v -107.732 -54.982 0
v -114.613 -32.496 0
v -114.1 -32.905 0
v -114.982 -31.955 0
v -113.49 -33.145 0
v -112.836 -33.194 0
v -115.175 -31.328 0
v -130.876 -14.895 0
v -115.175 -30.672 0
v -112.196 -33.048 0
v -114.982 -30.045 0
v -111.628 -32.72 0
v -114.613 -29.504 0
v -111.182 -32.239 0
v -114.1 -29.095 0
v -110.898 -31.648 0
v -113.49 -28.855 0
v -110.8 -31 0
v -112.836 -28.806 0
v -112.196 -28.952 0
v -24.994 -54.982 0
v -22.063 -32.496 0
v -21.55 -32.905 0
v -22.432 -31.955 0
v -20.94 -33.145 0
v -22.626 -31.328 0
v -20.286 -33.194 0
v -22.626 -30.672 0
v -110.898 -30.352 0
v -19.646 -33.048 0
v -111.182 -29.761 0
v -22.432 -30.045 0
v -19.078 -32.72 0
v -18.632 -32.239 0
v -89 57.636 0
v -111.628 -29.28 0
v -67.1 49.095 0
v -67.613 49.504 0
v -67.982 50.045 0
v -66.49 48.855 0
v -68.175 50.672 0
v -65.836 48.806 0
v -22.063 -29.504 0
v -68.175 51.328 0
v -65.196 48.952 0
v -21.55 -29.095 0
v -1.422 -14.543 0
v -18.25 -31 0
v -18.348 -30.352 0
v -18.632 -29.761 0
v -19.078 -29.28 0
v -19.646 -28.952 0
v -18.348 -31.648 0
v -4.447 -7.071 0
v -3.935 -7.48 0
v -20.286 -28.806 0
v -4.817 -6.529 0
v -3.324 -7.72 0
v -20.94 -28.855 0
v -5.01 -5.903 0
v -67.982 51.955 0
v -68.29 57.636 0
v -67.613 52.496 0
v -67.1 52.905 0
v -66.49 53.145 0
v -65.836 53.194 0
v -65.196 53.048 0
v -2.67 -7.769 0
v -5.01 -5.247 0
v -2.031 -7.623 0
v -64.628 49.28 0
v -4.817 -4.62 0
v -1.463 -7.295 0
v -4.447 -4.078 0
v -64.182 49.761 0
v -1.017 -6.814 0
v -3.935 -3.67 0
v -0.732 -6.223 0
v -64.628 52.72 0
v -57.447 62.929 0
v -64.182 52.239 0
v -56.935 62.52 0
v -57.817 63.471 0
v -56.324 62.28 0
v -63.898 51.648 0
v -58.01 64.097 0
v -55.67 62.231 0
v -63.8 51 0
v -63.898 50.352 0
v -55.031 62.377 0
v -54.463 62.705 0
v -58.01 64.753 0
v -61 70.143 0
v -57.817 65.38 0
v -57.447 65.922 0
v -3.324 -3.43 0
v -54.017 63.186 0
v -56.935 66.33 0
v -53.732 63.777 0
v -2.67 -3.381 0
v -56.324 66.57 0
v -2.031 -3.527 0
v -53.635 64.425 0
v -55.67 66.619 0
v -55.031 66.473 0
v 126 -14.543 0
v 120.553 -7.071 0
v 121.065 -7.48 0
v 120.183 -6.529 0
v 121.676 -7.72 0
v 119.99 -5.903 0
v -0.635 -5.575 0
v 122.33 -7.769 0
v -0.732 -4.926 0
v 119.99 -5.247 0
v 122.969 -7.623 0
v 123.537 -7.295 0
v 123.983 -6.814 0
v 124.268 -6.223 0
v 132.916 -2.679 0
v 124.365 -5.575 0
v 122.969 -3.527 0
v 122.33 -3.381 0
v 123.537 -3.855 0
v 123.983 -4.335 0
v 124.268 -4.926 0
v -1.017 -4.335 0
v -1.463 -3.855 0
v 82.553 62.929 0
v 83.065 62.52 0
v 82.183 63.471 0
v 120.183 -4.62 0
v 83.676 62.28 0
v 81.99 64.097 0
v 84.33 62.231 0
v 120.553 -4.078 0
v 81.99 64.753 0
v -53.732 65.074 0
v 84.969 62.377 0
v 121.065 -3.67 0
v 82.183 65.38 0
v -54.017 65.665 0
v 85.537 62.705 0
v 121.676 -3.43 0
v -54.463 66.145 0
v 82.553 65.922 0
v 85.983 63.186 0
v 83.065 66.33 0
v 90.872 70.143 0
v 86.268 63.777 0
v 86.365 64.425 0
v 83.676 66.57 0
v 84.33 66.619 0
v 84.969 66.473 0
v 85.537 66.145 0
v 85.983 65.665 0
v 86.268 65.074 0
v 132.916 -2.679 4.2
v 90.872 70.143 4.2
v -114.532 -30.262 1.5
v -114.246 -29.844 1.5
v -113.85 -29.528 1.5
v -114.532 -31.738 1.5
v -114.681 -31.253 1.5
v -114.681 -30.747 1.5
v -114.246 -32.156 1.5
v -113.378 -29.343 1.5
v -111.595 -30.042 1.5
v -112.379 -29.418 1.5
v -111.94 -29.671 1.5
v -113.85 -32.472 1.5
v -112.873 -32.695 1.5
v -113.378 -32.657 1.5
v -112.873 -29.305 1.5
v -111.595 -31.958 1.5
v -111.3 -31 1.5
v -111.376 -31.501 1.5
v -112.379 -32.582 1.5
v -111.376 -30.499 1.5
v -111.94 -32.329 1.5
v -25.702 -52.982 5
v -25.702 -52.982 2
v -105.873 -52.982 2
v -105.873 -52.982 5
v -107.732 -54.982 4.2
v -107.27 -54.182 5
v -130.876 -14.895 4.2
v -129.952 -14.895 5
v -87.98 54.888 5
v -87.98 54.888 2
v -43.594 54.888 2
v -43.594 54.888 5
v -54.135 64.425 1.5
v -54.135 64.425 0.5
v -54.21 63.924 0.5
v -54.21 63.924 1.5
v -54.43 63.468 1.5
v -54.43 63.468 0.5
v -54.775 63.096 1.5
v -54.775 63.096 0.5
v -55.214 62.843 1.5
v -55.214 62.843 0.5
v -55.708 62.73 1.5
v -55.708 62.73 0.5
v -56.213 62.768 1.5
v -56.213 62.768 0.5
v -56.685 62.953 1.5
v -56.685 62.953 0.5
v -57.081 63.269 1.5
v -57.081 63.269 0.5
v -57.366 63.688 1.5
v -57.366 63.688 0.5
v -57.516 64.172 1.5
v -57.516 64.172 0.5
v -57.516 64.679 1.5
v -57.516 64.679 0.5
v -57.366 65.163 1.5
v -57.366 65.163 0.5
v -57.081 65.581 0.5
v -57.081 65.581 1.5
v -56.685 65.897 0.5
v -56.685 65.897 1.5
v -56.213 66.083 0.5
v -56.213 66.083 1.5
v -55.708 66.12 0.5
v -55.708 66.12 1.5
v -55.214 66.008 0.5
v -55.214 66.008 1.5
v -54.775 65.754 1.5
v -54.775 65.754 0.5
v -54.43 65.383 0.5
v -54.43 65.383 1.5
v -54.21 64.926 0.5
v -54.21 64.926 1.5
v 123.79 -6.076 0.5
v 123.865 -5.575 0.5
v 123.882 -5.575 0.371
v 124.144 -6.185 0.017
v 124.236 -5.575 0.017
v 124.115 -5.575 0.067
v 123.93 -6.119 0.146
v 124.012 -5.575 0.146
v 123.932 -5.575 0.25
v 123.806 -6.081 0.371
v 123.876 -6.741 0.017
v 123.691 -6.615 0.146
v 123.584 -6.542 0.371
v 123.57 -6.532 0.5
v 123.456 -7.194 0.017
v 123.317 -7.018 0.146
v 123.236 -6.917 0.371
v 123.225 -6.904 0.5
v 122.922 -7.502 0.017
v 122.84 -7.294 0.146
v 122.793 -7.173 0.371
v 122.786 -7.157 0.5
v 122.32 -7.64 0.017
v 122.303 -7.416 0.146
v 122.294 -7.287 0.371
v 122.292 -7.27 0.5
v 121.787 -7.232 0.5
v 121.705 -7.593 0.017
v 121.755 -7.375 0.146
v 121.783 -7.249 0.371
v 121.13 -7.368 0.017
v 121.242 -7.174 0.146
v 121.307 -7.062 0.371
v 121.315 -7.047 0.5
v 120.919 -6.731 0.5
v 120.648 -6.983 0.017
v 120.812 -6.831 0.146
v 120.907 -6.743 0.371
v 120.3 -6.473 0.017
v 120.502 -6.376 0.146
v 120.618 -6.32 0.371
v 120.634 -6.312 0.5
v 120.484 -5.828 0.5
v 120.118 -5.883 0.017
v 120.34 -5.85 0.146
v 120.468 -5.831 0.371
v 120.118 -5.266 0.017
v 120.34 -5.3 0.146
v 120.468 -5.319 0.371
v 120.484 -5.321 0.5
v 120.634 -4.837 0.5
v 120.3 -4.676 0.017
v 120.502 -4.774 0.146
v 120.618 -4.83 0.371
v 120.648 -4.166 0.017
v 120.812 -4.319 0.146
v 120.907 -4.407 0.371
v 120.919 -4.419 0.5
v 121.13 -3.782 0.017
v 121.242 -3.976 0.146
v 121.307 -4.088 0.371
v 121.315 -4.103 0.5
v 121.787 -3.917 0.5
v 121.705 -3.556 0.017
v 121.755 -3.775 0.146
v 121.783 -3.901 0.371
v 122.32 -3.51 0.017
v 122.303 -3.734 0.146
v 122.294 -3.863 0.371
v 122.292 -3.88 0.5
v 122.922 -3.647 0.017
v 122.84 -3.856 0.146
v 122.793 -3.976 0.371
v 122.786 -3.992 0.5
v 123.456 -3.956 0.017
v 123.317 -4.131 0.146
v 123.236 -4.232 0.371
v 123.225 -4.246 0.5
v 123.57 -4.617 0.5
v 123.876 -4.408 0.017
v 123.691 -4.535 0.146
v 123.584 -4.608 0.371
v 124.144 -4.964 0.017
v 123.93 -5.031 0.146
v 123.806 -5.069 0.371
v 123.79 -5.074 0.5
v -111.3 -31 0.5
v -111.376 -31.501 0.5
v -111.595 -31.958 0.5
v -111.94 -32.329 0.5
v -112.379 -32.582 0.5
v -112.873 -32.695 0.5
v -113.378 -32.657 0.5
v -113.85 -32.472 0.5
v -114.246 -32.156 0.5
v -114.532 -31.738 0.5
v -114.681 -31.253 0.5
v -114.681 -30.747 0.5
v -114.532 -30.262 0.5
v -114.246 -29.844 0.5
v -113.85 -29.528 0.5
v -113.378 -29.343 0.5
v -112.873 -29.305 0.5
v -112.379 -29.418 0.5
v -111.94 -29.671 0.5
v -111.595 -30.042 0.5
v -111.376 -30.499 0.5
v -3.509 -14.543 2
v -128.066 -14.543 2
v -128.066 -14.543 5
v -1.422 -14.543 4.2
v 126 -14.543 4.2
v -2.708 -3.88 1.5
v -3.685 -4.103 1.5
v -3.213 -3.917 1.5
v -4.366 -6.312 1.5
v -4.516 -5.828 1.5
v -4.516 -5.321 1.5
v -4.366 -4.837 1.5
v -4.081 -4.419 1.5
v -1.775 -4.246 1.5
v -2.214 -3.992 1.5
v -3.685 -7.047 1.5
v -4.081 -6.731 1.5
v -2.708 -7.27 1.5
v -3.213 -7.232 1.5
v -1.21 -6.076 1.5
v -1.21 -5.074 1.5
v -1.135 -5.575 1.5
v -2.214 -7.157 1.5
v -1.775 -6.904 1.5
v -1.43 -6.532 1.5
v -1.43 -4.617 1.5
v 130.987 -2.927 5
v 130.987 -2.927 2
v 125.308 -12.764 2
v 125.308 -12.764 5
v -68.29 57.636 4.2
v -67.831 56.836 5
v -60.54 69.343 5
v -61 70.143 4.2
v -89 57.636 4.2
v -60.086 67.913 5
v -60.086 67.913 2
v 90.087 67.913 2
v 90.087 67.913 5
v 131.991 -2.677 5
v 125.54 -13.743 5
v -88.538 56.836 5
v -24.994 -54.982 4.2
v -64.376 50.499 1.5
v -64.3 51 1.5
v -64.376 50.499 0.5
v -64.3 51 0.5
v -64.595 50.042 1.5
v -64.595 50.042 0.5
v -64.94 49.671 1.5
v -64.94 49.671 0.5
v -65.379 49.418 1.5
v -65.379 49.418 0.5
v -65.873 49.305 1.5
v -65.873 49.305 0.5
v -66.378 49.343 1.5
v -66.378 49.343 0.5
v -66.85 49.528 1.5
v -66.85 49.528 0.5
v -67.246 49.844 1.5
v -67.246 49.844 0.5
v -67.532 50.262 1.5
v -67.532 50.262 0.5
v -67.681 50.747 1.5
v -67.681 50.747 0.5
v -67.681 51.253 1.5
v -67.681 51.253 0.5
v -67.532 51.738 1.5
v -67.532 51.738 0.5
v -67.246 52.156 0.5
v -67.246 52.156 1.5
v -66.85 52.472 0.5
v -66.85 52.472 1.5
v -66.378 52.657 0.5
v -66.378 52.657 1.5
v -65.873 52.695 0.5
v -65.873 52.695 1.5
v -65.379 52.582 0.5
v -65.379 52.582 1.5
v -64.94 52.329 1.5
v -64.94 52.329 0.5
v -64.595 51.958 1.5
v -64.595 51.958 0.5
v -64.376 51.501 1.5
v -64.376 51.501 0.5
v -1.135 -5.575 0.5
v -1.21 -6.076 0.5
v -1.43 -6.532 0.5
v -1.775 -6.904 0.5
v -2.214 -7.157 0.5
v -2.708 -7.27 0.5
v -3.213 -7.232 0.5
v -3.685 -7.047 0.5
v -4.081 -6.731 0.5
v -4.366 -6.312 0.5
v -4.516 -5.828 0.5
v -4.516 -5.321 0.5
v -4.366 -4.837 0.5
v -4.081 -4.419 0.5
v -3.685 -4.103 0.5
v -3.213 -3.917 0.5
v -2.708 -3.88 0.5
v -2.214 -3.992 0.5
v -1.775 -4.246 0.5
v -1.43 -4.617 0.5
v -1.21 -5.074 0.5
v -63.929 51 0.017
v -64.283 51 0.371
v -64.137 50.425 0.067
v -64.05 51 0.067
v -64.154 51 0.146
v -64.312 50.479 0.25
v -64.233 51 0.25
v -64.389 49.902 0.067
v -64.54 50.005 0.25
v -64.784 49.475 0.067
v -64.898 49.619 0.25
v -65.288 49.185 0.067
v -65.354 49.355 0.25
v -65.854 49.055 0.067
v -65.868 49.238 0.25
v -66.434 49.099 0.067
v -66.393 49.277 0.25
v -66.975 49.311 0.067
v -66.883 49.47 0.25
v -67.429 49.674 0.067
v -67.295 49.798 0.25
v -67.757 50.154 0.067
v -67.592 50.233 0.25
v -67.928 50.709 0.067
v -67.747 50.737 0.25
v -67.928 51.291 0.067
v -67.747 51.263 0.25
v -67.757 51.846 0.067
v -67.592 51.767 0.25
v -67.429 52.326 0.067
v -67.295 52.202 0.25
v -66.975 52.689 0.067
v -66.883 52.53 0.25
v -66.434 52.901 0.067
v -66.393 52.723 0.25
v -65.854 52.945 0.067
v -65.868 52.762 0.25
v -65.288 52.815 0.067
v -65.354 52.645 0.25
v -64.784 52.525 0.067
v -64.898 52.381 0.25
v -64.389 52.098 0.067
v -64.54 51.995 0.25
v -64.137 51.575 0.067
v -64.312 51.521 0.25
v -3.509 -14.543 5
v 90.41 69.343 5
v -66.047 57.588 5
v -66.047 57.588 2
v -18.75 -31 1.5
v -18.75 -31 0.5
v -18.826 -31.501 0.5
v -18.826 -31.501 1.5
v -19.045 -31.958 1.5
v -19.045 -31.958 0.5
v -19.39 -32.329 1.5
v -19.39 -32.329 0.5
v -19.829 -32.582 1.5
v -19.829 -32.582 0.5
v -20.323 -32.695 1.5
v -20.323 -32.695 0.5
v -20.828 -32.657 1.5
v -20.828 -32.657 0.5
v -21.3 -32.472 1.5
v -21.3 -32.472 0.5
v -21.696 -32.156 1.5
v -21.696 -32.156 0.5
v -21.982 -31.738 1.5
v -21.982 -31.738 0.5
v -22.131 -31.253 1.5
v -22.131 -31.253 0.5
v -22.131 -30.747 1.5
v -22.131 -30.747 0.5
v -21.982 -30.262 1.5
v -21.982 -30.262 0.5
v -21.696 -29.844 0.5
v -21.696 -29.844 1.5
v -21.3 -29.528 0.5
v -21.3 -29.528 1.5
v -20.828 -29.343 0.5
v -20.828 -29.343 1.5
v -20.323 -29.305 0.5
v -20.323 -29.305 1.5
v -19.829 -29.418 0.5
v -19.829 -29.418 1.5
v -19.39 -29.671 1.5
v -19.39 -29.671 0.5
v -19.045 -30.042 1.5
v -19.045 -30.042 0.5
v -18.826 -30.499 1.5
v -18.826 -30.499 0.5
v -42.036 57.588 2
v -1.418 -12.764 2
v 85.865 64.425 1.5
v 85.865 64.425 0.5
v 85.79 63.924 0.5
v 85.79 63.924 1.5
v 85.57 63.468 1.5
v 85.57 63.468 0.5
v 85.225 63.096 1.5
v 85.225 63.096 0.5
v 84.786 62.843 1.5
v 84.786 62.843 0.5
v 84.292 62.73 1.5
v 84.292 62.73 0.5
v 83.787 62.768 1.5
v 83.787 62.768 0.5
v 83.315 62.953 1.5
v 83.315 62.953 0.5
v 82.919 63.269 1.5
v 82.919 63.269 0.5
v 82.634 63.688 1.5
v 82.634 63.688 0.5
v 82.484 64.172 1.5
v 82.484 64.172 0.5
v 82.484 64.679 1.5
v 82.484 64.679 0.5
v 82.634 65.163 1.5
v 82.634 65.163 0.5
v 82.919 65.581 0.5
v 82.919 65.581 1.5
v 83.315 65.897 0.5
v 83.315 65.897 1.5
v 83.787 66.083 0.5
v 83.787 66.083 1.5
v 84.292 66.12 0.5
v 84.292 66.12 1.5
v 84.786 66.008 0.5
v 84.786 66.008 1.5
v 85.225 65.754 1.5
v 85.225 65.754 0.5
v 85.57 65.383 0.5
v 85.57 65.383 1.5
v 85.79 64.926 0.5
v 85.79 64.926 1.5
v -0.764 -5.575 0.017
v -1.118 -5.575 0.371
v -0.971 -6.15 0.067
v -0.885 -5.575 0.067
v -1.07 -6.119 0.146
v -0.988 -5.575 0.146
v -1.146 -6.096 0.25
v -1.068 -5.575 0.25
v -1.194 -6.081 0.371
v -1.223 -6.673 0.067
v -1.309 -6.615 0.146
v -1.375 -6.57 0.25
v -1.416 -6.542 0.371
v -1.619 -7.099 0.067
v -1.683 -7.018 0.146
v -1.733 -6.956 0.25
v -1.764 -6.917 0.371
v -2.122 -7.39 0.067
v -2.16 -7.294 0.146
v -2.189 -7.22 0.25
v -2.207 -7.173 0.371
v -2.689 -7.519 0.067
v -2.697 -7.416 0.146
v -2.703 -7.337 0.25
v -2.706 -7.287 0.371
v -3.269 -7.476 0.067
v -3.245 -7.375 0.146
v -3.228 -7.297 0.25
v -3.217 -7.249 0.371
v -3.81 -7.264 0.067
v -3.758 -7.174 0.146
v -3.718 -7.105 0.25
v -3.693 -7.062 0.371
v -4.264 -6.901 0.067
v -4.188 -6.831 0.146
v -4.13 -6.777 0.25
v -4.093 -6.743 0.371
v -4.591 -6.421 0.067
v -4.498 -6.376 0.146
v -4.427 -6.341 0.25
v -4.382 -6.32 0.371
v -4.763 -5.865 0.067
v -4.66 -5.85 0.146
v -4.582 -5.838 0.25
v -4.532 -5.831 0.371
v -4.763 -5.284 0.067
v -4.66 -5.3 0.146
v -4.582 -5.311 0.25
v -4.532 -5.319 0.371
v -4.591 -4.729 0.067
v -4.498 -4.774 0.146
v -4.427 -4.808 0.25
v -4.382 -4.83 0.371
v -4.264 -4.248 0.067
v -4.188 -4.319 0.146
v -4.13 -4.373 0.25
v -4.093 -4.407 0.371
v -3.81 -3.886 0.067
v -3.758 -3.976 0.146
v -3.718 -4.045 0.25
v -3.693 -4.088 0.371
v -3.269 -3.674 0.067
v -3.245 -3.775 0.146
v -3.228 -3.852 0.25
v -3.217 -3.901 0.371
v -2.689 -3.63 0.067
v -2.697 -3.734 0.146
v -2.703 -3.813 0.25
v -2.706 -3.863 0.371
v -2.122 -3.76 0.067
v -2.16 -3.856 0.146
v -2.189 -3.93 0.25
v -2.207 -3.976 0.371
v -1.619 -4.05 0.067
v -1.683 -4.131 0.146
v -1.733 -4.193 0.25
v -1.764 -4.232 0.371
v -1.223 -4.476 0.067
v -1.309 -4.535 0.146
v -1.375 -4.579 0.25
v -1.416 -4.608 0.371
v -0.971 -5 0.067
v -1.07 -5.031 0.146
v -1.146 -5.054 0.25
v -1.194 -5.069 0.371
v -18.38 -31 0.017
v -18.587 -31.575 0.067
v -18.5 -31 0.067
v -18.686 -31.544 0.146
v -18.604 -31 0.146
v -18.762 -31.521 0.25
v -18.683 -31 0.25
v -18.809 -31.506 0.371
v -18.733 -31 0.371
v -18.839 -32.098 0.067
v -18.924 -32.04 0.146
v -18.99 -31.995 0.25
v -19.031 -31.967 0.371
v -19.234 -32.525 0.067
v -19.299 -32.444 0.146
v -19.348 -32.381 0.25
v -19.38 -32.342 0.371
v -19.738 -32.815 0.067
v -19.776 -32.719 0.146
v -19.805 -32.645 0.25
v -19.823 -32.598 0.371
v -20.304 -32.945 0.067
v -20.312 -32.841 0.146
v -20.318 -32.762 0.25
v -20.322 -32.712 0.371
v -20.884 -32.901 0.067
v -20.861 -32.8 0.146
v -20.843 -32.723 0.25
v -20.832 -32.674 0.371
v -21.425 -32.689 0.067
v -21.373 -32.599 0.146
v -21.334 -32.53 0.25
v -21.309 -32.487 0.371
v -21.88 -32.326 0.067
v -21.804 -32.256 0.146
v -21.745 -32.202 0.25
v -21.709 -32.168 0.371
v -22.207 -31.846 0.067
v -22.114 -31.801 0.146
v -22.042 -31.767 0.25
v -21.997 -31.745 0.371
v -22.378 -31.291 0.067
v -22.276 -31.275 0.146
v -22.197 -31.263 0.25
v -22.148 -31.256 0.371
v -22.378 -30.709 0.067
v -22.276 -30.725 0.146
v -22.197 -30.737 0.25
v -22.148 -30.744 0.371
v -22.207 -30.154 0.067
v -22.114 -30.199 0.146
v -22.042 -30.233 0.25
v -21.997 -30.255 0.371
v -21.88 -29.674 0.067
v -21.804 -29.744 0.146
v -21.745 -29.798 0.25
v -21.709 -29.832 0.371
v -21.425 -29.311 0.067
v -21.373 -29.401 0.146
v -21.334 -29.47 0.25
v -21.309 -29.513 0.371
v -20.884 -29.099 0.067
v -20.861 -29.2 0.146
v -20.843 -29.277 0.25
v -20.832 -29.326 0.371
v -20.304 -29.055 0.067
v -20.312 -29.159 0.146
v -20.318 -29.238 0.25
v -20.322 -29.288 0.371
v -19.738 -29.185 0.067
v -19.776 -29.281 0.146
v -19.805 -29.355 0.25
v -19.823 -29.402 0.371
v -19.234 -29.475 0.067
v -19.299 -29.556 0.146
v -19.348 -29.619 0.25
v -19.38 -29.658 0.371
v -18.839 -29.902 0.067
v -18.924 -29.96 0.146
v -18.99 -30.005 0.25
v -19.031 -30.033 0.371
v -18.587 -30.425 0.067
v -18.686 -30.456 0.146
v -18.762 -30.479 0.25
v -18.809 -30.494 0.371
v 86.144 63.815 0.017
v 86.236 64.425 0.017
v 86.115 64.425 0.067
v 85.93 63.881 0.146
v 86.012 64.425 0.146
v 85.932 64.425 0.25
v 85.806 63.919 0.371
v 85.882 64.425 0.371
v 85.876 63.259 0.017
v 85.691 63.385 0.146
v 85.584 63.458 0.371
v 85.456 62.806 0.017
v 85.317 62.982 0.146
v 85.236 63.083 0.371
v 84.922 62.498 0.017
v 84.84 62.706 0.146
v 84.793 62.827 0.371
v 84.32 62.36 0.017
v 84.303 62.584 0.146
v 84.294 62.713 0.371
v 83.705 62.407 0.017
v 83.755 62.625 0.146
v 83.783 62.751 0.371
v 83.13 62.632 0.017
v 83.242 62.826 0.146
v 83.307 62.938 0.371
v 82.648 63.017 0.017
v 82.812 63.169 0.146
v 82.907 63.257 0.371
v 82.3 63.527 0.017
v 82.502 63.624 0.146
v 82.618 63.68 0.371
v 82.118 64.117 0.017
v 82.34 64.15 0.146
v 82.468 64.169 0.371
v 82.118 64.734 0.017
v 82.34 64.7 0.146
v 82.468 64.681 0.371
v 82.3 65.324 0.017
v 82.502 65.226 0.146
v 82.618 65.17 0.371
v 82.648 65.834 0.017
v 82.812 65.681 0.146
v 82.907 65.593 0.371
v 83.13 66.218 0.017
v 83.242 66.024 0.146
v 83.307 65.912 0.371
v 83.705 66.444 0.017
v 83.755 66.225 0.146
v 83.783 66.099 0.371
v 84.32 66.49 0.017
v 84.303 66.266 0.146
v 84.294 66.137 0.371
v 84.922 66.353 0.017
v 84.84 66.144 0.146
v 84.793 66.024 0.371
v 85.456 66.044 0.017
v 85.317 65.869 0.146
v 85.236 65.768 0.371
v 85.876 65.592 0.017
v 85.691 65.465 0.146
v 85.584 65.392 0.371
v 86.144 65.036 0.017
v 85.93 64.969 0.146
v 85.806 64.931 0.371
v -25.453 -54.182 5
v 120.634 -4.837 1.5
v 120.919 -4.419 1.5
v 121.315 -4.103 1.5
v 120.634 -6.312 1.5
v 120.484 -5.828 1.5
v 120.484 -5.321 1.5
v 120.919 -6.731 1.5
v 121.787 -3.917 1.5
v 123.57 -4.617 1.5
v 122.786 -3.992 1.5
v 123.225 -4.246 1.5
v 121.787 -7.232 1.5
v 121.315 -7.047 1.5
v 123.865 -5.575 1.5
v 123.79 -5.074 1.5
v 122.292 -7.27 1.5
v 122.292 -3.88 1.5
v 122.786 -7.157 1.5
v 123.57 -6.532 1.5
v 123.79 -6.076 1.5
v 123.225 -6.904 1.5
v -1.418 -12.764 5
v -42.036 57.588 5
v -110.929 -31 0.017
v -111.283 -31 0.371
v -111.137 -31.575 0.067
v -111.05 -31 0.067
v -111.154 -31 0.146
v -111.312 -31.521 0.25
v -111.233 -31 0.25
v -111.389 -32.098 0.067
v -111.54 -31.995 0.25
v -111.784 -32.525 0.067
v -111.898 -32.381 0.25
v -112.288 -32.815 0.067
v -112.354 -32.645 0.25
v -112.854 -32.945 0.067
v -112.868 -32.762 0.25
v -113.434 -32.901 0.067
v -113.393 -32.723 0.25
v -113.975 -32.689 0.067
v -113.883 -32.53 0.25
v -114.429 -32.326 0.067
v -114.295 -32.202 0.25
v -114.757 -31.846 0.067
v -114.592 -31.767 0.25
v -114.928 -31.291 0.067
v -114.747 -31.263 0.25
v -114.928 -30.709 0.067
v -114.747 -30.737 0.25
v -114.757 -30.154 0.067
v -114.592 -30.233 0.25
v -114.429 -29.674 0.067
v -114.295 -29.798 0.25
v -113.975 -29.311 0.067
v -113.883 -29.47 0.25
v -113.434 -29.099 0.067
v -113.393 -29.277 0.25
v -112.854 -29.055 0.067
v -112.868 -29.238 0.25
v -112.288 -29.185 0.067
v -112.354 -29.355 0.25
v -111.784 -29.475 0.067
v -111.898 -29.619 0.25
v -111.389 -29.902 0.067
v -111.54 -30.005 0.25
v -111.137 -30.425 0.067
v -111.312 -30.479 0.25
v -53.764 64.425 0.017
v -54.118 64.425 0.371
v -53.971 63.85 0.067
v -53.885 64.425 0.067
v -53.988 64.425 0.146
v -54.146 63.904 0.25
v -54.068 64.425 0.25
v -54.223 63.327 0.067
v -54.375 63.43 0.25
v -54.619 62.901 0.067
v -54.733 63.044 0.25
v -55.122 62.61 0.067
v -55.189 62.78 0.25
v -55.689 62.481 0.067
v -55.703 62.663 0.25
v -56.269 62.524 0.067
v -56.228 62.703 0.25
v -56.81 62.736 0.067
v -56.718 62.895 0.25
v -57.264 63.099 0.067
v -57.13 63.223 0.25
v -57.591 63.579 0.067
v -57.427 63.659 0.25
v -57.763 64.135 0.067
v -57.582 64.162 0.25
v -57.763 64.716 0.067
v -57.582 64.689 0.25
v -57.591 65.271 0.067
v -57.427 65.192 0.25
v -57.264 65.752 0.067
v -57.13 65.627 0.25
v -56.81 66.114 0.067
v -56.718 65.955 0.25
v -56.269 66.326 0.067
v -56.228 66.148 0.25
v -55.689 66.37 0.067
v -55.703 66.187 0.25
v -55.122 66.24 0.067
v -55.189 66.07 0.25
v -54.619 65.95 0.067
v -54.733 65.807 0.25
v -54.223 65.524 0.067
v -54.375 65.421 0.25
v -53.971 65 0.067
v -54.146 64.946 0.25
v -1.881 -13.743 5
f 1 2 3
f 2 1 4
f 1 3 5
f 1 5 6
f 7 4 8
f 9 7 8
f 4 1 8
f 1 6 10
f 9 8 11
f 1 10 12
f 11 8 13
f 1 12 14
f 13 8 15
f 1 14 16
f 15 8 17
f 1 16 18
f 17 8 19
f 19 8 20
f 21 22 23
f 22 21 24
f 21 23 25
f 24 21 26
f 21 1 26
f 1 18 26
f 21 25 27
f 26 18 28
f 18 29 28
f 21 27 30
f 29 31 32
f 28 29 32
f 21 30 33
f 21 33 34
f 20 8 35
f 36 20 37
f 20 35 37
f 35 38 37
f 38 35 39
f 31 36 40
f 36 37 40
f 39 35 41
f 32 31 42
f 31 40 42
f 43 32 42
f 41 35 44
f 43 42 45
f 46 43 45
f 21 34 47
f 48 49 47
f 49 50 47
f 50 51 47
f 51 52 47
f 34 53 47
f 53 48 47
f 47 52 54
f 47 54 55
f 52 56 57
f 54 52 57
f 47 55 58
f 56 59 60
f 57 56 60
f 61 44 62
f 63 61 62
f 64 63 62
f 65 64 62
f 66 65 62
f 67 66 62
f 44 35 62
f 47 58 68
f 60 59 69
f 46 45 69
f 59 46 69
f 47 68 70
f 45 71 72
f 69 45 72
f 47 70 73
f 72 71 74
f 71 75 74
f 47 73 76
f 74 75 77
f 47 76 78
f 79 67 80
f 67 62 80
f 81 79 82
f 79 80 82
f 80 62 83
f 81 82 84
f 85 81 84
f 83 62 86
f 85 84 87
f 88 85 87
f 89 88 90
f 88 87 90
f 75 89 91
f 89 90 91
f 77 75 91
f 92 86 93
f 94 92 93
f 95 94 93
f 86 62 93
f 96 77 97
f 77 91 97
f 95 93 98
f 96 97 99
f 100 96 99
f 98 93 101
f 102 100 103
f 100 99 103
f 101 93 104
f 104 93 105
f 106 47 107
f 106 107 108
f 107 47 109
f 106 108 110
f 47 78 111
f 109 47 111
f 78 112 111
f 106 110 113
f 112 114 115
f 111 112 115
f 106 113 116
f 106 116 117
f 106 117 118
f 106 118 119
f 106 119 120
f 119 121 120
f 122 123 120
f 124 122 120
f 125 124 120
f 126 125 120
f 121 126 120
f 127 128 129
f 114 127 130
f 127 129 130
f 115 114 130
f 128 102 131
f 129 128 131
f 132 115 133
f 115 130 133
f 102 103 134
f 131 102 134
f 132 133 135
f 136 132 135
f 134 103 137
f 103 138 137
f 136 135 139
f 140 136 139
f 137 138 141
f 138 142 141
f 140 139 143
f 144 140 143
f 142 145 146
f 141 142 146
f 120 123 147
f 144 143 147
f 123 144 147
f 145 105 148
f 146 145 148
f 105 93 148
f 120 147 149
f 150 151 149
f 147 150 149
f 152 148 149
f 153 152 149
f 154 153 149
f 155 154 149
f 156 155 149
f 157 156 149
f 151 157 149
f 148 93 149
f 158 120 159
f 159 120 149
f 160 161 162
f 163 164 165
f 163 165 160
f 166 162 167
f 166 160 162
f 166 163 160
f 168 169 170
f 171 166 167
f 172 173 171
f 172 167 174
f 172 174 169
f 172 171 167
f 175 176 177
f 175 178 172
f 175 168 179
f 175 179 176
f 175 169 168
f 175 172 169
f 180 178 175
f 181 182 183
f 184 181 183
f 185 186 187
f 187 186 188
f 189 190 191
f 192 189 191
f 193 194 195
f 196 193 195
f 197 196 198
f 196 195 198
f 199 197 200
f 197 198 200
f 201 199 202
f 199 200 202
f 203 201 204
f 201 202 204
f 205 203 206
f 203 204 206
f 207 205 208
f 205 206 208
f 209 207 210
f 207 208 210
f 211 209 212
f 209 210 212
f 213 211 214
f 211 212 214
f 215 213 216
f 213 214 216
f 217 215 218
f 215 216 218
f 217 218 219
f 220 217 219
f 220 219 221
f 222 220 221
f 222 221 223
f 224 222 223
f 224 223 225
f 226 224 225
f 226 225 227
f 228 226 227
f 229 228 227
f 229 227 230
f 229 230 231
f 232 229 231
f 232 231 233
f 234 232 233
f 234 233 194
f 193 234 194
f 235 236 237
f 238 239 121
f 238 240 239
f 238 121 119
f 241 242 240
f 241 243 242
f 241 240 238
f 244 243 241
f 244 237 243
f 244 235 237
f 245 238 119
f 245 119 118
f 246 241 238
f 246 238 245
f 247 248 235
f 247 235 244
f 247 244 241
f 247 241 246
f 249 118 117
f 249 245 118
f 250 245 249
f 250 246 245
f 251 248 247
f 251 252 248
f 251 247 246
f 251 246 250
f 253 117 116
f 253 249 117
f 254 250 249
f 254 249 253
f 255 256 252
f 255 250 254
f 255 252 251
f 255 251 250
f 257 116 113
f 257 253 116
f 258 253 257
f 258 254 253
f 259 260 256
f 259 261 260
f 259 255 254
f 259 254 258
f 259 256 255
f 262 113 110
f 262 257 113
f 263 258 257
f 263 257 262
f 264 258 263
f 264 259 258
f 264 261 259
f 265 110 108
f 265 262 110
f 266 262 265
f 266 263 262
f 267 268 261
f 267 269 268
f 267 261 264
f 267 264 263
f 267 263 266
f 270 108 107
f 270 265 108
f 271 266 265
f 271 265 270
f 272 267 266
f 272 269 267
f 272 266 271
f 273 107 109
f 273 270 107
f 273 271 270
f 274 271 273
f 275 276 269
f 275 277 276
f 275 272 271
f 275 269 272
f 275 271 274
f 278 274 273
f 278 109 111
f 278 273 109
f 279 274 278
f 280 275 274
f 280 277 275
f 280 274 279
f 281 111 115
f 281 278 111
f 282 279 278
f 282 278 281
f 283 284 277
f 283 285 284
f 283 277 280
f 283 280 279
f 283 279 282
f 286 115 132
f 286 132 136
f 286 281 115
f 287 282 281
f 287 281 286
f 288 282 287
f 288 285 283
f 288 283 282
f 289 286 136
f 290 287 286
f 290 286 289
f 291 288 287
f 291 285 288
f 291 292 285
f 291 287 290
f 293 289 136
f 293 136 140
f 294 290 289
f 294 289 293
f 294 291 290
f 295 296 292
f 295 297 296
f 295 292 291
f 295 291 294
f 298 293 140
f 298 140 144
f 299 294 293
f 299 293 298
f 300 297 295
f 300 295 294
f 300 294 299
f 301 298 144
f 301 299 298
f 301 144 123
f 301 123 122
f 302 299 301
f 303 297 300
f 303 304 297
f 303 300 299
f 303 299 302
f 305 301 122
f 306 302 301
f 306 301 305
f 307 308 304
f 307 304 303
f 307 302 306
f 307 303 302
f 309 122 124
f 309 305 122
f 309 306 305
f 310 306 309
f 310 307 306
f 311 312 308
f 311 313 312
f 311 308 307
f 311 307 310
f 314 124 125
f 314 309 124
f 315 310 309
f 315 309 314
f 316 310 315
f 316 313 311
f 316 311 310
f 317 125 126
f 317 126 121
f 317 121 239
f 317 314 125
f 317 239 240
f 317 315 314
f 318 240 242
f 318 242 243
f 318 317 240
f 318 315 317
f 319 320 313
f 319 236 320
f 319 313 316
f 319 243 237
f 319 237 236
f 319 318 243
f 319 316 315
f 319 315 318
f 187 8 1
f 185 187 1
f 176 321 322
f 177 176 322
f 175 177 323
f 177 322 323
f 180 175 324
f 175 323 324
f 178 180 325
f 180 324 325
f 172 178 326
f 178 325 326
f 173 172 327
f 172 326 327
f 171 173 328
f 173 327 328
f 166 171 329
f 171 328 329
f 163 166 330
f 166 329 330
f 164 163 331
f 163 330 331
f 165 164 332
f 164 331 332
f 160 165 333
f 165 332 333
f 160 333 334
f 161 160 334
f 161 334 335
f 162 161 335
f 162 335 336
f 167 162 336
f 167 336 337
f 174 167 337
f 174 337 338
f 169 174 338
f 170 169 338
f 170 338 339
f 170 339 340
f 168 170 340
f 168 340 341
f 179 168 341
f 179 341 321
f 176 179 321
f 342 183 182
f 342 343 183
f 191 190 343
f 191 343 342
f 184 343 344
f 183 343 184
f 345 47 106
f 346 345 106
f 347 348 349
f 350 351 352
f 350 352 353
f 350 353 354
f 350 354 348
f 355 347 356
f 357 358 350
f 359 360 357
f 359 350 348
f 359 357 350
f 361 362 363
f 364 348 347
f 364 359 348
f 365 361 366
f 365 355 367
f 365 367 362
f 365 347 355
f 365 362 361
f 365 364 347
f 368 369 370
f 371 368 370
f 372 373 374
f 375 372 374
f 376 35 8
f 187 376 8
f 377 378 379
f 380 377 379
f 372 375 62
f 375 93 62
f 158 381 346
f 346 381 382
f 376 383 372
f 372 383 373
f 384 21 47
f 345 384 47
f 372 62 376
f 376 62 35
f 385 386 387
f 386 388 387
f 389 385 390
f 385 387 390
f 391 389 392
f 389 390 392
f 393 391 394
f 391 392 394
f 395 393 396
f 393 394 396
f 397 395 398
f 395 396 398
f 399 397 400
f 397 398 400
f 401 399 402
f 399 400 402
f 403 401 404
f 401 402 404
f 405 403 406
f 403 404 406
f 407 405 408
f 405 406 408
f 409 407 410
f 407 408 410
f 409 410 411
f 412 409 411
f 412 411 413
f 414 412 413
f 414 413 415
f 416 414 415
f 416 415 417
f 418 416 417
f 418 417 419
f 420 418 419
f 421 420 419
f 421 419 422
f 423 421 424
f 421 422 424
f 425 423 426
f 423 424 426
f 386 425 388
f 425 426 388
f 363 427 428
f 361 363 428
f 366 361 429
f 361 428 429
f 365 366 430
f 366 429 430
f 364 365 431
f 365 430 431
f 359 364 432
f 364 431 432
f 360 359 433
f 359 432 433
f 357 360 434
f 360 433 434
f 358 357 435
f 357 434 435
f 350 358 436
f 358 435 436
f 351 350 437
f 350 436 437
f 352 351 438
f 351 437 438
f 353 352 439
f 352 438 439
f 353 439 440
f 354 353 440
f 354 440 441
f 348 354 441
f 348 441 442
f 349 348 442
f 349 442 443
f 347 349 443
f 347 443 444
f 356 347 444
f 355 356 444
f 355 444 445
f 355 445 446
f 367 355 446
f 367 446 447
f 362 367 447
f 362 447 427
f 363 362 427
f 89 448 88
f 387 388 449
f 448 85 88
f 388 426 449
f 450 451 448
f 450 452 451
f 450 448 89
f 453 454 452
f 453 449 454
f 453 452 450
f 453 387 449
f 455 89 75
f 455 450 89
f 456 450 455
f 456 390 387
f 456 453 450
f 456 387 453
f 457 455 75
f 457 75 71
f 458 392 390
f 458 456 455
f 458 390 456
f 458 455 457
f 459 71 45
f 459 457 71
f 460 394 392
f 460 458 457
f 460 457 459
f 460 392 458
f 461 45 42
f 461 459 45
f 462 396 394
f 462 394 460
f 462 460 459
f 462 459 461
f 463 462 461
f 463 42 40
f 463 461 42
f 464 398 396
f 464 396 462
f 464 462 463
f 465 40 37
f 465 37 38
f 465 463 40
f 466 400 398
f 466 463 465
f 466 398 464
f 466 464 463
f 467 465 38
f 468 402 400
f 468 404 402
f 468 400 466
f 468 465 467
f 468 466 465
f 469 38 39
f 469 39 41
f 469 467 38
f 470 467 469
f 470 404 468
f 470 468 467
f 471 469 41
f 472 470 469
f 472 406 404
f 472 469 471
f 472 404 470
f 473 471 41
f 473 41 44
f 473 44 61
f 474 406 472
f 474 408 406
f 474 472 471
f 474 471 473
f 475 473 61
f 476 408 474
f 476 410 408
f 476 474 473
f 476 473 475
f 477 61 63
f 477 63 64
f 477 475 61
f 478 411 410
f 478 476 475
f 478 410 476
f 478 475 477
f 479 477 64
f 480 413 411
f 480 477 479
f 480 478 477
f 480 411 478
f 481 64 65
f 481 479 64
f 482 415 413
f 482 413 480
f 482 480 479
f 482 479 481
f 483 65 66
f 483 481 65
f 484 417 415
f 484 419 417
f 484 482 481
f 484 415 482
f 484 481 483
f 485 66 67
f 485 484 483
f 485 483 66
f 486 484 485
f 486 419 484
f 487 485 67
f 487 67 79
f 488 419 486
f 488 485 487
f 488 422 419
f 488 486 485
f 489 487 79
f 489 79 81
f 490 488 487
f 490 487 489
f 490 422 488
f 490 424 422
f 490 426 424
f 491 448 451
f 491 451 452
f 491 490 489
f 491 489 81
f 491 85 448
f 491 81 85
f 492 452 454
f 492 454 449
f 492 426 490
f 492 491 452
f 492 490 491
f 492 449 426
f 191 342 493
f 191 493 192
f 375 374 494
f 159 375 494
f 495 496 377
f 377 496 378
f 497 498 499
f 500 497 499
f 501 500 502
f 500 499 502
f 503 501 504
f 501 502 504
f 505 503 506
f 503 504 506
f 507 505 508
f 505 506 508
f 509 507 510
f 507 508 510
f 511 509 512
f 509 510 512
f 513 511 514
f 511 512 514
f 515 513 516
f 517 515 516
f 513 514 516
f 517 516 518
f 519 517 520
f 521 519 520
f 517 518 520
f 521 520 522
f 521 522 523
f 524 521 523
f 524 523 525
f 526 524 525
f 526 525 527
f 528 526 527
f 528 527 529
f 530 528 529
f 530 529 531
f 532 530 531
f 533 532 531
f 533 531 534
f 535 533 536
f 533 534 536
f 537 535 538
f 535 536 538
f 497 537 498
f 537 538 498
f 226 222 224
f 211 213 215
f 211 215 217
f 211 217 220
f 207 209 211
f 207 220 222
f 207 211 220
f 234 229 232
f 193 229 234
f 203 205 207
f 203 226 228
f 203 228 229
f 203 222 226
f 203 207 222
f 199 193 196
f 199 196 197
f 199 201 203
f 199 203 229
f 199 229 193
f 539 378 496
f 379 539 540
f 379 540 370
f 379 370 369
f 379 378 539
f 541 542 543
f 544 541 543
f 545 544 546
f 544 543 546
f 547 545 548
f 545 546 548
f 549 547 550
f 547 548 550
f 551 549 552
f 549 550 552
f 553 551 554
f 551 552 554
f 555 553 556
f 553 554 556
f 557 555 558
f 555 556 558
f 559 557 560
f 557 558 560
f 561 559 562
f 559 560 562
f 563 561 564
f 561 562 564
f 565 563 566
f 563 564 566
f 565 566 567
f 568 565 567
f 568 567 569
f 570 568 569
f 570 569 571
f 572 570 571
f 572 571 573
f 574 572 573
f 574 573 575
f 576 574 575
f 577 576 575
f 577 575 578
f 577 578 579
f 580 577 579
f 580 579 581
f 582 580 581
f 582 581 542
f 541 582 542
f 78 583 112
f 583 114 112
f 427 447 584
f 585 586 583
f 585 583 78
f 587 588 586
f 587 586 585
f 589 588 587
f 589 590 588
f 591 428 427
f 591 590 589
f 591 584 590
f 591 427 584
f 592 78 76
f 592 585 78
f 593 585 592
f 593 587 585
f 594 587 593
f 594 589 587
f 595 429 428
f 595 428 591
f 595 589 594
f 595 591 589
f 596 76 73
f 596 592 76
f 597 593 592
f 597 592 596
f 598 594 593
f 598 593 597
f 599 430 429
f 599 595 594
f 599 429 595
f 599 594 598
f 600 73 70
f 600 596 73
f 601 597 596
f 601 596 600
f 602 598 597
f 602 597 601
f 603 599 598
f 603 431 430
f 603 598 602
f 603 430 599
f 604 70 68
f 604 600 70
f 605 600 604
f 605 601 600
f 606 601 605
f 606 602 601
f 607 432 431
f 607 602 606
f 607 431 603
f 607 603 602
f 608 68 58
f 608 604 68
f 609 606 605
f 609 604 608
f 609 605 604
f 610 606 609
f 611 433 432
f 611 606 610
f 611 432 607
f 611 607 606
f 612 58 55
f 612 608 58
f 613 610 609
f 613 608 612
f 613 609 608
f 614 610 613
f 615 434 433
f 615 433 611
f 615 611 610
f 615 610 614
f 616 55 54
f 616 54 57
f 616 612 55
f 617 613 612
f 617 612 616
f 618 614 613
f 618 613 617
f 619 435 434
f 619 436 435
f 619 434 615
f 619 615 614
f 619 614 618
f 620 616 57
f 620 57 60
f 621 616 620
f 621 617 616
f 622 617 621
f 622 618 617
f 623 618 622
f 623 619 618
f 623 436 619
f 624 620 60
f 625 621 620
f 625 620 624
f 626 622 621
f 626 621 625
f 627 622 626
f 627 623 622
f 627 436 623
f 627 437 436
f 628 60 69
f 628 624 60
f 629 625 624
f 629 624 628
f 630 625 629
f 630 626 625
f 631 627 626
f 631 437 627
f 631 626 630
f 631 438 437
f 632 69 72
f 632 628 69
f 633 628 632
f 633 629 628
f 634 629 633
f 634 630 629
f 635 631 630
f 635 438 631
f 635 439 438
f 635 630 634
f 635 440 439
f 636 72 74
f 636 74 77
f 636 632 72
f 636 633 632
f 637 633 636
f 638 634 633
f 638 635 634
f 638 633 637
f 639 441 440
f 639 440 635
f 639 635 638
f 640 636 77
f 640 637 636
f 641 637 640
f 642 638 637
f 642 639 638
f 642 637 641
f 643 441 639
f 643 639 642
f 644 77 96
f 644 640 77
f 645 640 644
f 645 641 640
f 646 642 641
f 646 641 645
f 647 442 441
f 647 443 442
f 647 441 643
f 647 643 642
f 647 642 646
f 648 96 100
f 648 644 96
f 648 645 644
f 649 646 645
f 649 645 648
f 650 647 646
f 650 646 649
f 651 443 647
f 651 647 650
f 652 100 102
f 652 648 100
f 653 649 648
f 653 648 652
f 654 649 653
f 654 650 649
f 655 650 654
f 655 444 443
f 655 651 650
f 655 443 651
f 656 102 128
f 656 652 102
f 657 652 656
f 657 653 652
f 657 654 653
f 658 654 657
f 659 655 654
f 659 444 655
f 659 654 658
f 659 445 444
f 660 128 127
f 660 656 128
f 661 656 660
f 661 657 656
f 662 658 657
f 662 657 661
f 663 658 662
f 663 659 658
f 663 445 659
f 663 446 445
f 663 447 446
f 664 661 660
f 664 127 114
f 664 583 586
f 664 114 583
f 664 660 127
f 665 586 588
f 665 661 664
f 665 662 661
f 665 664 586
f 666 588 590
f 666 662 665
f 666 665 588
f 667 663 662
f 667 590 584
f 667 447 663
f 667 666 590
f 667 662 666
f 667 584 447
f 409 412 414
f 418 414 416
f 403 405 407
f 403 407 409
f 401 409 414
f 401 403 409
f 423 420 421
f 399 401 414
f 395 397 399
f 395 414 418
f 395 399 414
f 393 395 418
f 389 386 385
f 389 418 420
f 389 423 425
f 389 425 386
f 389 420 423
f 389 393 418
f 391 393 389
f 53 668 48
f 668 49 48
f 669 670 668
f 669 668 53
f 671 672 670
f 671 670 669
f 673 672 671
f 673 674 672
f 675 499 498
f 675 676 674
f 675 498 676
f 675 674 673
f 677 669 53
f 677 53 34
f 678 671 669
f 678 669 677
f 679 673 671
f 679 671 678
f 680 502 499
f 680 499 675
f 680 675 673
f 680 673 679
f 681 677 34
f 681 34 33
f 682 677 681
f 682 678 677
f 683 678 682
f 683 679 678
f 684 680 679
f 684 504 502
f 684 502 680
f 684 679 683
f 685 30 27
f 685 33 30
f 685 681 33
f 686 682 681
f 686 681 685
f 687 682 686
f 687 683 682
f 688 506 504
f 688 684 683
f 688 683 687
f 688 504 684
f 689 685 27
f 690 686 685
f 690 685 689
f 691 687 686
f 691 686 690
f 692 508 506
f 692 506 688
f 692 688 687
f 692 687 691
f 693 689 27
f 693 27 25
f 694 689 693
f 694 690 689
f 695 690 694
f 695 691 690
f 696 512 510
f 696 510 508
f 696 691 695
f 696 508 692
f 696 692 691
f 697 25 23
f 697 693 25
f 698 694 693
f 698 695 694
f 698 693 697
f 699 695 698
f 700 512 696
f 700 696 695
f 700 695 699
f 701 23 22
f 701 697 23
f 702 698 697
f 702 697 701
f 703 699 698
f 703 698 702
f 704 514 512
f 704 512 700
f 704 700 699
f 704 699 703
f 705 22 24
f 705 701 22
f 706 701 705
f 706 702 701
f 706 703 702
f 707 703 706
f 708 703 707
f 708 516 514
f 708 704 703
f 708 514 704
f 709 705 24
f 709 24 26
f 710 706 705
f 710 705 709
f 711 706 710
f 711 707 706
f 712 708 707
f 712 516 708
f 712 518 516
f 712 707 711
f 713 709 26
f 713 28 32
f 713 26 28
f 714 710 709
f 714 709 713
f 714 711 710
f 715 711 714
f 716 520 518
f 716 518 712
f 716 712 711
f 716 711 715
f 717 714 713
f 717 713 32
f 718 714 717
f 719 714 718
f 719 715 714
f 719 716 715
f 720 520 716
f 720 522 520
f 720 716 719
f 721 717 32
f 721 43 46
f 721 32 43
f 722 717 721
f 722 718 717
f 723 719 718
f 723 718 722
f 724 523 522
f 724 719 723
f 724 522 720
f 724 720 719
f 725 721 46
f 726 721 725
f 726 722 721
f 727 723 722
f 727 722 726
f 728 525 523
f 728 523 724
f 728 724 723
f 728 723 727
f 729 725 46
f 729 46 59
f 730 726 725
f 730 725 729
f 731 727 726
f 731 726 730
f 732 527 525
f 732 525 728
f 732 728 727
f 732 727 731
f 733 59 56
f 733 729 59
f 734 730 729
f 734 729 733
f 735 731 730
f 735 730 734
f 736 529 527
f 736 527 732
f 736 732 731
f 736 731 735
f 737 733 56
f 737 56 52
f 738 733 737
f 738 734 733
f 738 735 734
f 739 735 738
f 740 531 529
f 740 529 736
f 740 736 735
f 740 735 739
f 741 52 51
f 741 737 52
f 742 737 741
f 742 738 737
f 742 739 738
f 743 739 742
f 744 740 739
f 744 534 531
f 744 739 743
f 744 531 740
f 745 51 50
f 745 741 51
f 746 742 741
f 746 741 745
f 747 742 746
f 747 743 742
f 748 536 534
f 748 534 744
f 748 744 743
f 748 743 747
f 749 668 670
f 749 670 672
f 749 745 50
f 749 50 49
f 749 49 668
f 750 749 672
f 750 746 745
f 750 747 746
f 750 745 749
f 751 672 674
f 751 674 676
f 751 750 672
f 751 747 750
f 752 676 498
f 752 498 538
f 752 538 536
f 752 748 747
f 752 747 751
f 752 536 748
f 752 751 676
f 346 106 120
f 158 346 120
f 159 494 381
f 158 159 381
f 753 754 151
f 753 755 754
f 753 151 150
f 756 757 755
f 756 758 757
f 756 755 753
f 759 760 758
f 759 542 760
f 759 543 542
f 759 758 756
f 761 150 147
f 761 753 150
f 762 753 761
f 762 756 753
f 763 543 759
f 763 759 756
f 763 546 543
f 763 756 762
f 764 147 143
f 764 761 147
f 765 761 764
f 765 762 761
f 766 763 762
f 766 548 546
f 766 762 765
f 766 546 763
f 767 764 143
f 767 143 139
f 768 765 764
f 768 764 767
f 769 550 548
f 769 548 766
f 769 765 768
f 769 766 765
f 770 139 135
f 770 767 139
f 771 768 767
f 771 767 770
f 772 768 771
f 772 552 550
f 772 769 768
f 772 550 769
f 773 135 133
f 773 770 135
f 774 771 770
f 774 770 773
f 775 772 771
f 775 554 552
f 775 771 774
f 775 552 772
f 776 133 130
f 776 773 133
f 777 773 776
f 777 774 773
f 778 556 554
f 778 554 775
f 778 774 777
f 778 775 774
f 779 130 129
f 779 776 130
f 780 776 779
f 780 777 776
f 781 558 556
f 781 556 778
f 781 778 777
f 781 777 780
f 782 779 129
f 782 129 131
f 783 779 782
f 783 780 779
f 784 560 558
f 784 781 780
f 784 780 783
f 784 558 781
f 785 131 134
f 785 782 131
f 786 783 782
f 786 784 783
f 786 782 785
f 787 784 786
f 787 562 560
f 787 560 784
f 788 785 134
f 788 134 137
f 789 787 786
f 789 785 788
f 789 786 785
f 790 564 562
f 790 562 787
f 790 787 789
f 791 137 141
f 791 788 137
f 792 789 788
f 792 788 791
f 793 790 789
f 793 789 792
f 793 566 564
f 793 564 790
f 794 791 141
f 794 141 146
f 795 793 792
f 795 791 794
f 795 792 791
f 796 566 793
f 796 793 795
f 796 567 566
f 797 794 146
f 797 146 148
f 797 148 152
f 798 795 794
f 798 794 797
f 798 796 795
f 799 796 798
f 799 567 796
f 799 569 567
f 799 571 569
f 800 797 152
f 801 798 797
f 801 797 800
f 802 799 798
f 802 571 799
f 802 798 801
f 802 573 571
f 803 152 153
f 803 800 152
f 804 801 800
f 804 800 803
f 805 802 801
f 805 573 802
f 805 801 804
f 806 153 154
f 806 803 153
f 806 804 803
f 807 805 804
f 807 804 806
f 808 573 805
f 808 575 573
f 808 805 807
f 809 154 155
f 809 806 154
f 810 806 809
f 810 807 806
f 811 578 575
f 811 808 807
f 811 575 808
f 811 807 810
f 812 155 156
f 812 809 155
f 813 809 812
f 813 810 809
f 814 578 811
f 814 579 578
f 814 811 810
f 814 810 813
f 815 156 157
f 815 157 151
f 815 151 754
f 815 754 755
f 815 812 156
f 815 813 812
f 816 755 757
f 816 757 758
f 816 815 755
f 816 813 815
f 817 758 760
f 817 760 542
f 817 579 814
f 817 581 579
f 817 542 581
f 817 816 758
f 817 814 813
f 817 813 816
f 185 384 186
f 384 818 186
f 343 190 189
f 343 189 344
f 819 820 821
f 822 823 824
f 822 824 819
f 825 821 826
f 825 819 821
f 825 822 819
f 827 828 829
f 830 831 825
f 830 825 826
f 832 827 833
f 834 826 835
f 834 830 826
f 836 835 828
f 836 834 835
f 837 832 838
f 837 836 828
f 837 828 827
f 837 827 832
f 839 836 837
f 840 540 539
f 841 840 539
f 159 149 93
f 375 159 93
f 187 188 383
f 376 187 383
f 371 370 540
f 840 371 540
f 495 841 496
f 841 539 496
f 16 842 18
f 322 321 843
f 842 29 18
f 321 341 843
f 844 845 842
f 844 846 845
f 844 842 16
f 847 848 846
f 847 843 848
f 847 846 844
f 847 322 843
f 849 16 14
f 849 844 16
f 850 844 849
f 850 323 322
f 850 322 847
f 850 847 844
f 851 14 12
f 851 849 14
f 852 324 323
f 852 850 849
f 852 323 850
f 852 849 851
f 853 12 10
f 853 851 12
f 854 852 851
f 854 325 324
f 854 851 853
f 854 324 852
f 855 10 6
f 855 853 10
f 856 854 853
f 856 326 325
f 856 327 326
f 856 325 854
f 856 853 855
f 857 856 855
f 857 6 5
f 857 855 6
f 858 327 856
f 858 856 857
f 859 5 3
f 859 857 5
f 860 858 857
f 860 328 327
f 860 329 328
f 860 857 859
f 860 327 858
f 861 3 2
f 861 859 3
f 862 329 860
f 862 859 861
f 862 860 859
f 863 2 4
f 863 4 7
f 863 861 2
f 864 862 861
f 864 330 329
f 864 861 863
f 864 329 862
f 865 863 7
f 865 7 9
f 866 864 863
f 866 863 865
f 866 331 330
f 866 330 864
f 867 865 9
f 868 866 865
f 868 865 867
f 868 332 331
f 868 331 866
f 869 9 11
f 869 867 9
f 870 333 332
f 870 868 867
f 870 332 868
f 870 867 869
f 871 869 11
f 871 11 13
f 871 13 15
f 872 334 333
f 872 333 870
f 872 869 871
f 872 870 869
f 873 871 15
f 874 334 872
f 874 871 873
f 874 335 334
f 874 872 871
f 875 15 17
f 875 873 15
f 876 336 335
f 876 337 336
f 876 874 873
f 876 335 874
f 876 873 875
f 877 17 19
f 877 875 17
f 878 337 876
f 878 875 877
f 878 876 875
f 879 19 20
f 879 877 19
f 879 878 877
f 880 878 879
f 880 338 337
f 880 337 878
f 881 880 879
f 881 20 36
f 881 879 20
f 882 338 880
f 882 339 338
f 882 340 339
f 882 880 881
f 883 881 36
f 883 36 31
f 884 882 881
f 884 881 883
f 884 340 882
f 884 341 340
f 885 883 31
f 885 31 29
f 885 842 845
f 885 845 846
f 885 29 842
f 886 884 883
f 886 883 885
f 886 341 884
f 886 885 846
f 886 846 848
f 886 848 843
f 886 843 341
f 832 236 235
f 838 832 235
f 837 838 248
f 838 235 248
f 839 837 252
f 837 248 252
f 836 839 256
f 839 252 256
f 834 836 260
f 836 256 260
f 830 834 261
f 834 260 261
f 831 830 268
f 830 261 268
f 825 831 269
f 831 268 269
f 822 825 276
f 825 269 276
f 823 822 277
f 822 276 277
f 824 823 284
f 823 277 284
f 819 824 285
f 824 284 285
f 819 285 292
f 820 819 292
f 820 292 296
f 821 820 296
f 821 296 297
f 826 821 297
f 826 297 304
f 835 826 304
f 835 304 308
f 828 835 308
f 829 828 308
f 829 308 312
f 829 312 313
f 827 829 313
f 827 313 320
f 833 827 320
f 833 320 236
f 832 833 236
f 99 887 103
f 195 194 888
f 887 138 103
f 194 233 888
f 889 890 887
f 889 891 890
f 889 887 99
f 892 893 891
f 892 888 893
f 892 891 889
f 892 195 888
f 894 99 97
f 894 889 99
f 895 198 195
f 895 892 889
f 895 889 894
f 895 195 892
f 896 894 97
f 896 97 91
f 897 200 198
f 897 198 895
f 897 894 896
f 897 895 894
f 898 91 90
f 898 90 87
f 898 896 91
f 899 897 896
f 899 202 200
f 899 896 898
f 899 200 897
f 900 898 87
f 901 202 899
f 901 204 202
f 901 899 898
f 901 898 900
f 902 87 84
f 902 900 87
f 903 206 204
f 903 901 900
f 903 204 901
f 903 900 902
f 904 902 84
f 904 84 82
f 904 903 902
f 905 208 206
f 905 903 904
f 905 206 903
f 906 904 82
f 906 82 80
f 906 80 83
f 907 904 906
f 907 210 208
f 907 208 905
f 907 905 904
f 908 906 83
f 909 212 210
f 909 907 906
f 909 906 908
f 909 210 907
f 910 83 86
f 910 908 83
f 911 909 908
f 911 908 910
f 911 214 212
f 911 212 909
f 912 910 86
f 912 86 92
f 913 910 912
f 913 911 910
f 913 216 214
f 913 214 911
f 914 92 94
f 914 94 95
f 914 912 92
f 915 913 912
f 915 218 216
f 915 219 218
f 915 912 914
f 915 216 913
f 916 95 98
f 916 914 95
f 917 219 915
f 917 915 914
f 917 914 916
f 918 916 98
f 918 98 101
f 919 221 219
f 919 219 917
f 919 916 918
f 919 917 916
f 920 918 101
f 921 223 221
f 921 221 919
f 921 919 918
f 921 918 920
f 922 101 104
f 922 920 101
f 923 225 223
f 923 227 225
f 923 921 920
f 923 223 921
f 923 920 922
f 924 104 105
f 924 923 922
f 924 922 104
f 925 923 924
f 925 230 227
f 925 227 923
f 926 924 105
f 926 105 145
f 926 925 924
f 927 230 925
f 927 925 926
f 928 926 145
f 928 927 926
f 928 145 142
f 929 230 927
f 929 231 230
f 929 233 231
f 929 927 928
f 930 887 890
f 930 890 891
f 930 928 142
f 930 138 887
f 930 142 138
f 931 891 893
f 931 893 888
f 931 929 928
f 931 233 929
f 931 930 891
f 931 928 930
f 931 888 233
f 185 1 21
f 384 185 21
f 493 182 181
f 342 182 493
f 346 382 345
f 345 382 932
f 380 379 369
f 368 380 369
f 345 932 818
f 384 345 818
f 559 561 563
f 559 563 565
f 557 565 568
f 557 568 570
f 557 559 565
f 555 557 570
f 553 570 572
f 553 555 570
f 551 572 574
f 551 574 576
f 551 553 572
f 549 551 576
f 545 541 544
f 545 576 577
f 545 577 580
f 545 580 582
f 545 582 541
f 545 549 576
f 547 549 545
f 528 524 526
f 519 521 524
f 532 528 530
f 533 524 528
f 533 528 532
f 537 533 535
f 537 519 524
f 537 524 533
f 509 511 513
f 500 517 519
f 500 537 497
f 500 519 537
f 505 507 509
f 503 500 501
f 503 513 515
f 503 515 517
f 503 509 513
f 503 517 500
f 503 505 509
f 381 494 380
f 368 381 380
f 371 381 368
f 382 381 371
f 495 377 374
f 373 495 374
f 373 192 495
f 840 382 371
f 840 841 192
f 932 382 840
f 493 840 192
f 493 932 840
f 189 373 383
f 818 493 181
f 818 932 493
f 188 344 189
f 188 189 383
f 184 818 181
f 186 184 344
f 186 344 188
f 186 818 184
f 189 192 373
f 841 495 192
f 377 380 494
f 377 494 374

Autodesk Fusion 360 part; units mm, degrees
sketch "Sketch1" plane through (0, 0, 0) normal (0, 0, 1) x (1, 0, 0)
  line L0 (132.9156, -2.6788) -> (90.8719, 70.1431)
  line L1 (-68.2902, 57.6361) -> (-89, 57.6361)
  line L2 (-130.8761, -14.8954) -> (-107.7319, -54.9824)
  line L3 (-1.4217, -14.5431) -> (126, -14.5431)
  line L4 (126, -14.5431) -> (132.9156, -2.6788)
  line L5 (-61, 70.1431) -> (-68.2902, 57.6361)
  line L6 (-89, 57.6361) -> (-130.8761, -14.8954)
  line L7 (-106, -54.9824) -> (-24.9935, -54.9824)
  line L8 (-24.9935, -54.9824) -> (-1.4217, -14.5431)
  line L9 (90.8719, 70.1431) -> (-61, 70.1431)
  line L10 (-107.7319, -54.9824) -> (-106, -54.9824)
  point P0 (-65.7873, -4.2127)
  point P1 (-65.7873, -4.2127)
  point P2 (-65.7873, -4.2127)
  dimension "d4" = 94.1192
  dimension "d5" = 81.0065
  dimension "d6" = 14.5431
  dimension "d7" = 1.4217
  dimension "d8" = 125.1255
  dimension "d9" = 263.7917
  dimension "d10" = 120
  dimension "d11" = 120
  dimension "d12" = 120.238
  dimension "d13" = 234.5587
  dimension "d14" = 204.2045
  dimension "d15" = 151.8719
  dimension "d16" = 20.7098
  dimension "d17" = 46.8077
  dimension "d18" = 10.3305
  dimension "d19" = 64.3656
extrude "Extrude1" add sketch "Sketch1" along normal blind 2
sketch "Sketch2" plane through (0, 0, 2) normal (0, 0, 1) x (-1, 0, 0)
  line L0 (107.7319, 54.9824) -> (24.9935, 54.9824)
  line L1 (24.9935, 54.9824) -> (1.4217, 14.5431)
  line L2 (1.4217, 14.5431) -> (-126, 14.5431)
  line L3 (-126, 14.5431) -> (-132.9156, 2.6788)
  line L4 (-132.9156, 2.6788) -> (-90.8719, -70.1431)
  line L5 (-90.8719, -70.1431) -> (61, -70.1431)
  line L6 (61, -70.1431) -> (68.2902, -57.6361)
  line L7 (68.2902, -57.6361) -> (89, -57.6361)
  line L8 (89, -57.6361) -> (130.8761, 14.8954)
  line L9 (130.8761, 14.8954) -> (107.7319, 54.9824)
  line L10 (60.0858, -67.913) -> (-90.0874, -67.913)
  line L11 (-130.8139, 2.9274) -> (-125.2213, 12.6142)
  line L12 (25.7881, 52.8324) -> (3.6818, 14.5431)
  line L13 (-126, 14.5431) -> (-132.9156, 2.6788)
  line L14 (-125.3079, 12.7642) -> (1.418, 12.7642)
  line L15 (-90.8719, -70.1431) -> (61, -70.1431)
  line L16 (3.6818, 14.5431) -> (43.681, -54.7376)
  line L17 (1.4217, 14.5431) -> (-126, 14.5431)
  line L18 (25.7015, 52.9824) -> (3.5086, 14.5431)
  line L19 (3.5086, 14.5431) -> (43.5944, -54.8876)
  line L20 (1.3314, 12.6142) -> (41.949, -57.7376)
  line L21 (59.9992, -67.763) -> (-90.0008, -67.763)
  line L22 (-130.9871, 2.9274) -> (-125.3079, 12.7642)
  line L23 (-125.2213, 12.6142) -> (1.3314, 12.6142)
  line L24 (-90.0008, -67.763) -> (-130.8139, 2.9274)
  line L25 (87.8937, -54.7376) -> (43.681, -54.7376)
  line L26 (65.7873, 4.2127) -> (65.7873, -54.7376)
  line L27 (-90.0874, -67.913) -> (-130.9871, 2.9274)
  line L28 (106, 54.9824) -> (24.9935, 54.9824)
  line L29 (61, -70.1431) -> (68.2902, -57.6361)
  line L30 (68.2902, -57.6361) -> (89, -57.6361)
  line L31 (-132.9156, 2.6788) -> (-90.8719, -70.1431)
  line L32 (87.9803, -54.8876) -> (43.5944, -54.8876)
  line L33 (41.949, -57.7376) -> (65.7873, -57.7376)
  circle A0 centre (65.7873, 4.2127) radius 44.2127
  line L34 (25.7015, 52.9824) -> (105.8732, 52.9824)
  line L35 (42.0356, -57.5876) -> (66.0471, -57.5876)
  line L36 (65.7873, 4.2127) -> (14.7349, 33.6878)
  line L37 (107.7319, 54.9824) -> (106, 54.9824)
  line L38 (65.7873, 4.2127) -> (116.8397, 33.6878)
  line L39 (89, -57.6361) -> (130.8761, 14.8954)
  line L40 (130.8761, 14.8954) -> (107.7319, 54.9824)
  line L41 (128.0661, 14.5431) -> (105.8732, 52.9824)
  line L42 (66.0471, -57.5876) -> (60.0858, -67.913)
  line L43 (87.9803, -54.8876) -> (128.0661, 14.5431)
  line L44 (65.7873, -57.7376) -> (59.9992, -67.763)
  line L45 (127.8929, 14.5431) -> (105.7866, 52.8324)
  line L46 (87.8937, -54.7376) -> (127.8929, 14.5431)
  line L47 (65.7873, 4.2127) -> (65.7873, -84.2127) construction
  line L48 (25.7881, 52.8324) -> (105.7866, 52.8324)
  line L49 (65.7873, 4.2127) -> (65.7873, -84.2127) construction
  line L50 (1.418, 12.7642) -> (42.0356, -57.5876)
  line L51 (24.9935, 54.9824) -> (1.4217, 14.5431)
  point P0 (65.7873, 4.2127)
  point P1 (65.7873, 4.2127)
  point P2 (65.7873, 4.2127)
  dimension "d22" = -0.15
  dimension "d23" = 0.15
  dimension "d24" = 120
  dimension "d25" = 120
  dimension "d26" = 88.4253
  dimension "d27" = 62.1056
  dimension "d28" = 39.9992
  dimension "d29" = 22.1063
  dimension "d30" = 39.9992
  dimension "d31" = 29.4751
  dimension "d32" = 3
  dimension "d33" = 3
  dimension "d34" = 150
  dimension "d35" = 126.5527
  dimension "d36" = 196.6013
  dimension "d37" = 8.4015
  dimension "d38" = 12.6142
  dimension "d40" = 2
  dimension "d41" = 0.238
  dimension "d43" = 0.1015
  dimension "d44" = 20.052
  dimension "d45" = 1.9444
  dimension "d46" = 2.2813
  dimension "d47" = 9.9353
  dimension "d48" = 82.7572
  dimension "d49" = 94.1192
  dimension "d51" = 81.0065
extrude "Extrude2" add sketch "Sketch2" along normal blind 3 contours L0 L1 L2 L3 L4 L5 L6 L7 L8 L9 L13 L15 L17 L28 L29 L30 L31 L37 L39 L40 L51
chamfer "Chamfer1" distance 0.8 angle 45 10 edges at (-109.9381, 21.3703, 5) (-78.6451, 57.6361, 5) (-64.6451, 63.8896, 5) (14.936, 70.1431, 5) (111.8938, 33.7321, 5) (129.4578, -8.611, 5) (62.2891, -14.5431, 5) (-13.2076, -34.7628, 5) (-119.304, -34.9389, 5) (-66.3627, -54.9824, 5)
sketch "Sketch3" plane through (0, 0, 0) normal (0, 0, -1) x (1, 0, 0)
  line L0 (-24.9935, 54.9824) -> (-107.7319, 54.9824)
  line L1 (-107.7319, 54.9824) -> (-130.8761, 14.8954)
  line L2 (-130.8761, 14.8954) -> (-89, -57.6361)
  line L3 (-89, -57.6361) -> (-68.2902, -57.6361)
  line L4 (-68.2902, -57.6361) -> (-61, -70.1431)
  line L5 (-61, -70.1431) -> (90.8719, -70.1431)
  line L6 (90.8719, -70.1431) -> (132.9156, 2.6788)
  line L7 (132.9156, 2.6788) -> (126, 14.5431)
  line L8 (126, 14.5431) -> (-1.4217, 14.5431)
  line L9 (-1.4217, 14.5431) -> (-24.9935, 54.9824)
  circle A0 centre (-113, 31) radius 1.7
  circle A1 centre (-20.4501, 31) radius 1.7
  line L10 (-113, 31) -> (-20.4501, 31)
  line L11 (-20.4501, 31) -> (-66.725, 31)
  circle A2 centre (-66, -51) radius 1.7
  circle A3 centre (122.1654, 5.5748) radius 1.7
  circle A4 centre (-2.8346, 5.5748) radius 1.7
  circle A5 centre (-55.8346, -64.4252) radius 1.7
  circle A6 centre (84.1654, -64.4252) radius 1.7
  point P0 (-2.8346, 5.5748)
  point P1 (-55.8346, -64.4252)
  dimension "d55" = 3.4
  dimension "d56" = 3.4
  dimension "d57" = 3.4
  dimension "d58" = 3.4
  dimension "d59" = 3.4
  dimension "d60" = 3.4
  dimension "d61" = 3.4
  dimension "d62" = 16.1046
  dimension "d63" = 253.0415
  dimension "d64" = 215.0415
  dimension "d65" = 128.0415
  dimension "d66" = 75.0415
  dimension "d67" = 64.8761
  dimension "d68" = 110.426
  dimension "d69" = 92.5499
  dimension "d70" = 79.3207
  dimension "d71" = 65.8954
  dimension "d72" = 9.3207
extrude "Extrude4" cut sketch "Sketch3" against normal blind 1.5 contours A0 | A1 | A2 | A3 | A4 | A5 | A6
fillet "Fillet1" radius 0.5 7 edges at (-22.0351, -31.6147, 0) (-114.585, -31.6147, 0) (-67.585, 50.3853, 0) (-57.4195, 63.8105, 0) (-4.4195, -6.1895, 0) (120.5805, -6.1895, 0) (82.5805, 63.8105, 0)
